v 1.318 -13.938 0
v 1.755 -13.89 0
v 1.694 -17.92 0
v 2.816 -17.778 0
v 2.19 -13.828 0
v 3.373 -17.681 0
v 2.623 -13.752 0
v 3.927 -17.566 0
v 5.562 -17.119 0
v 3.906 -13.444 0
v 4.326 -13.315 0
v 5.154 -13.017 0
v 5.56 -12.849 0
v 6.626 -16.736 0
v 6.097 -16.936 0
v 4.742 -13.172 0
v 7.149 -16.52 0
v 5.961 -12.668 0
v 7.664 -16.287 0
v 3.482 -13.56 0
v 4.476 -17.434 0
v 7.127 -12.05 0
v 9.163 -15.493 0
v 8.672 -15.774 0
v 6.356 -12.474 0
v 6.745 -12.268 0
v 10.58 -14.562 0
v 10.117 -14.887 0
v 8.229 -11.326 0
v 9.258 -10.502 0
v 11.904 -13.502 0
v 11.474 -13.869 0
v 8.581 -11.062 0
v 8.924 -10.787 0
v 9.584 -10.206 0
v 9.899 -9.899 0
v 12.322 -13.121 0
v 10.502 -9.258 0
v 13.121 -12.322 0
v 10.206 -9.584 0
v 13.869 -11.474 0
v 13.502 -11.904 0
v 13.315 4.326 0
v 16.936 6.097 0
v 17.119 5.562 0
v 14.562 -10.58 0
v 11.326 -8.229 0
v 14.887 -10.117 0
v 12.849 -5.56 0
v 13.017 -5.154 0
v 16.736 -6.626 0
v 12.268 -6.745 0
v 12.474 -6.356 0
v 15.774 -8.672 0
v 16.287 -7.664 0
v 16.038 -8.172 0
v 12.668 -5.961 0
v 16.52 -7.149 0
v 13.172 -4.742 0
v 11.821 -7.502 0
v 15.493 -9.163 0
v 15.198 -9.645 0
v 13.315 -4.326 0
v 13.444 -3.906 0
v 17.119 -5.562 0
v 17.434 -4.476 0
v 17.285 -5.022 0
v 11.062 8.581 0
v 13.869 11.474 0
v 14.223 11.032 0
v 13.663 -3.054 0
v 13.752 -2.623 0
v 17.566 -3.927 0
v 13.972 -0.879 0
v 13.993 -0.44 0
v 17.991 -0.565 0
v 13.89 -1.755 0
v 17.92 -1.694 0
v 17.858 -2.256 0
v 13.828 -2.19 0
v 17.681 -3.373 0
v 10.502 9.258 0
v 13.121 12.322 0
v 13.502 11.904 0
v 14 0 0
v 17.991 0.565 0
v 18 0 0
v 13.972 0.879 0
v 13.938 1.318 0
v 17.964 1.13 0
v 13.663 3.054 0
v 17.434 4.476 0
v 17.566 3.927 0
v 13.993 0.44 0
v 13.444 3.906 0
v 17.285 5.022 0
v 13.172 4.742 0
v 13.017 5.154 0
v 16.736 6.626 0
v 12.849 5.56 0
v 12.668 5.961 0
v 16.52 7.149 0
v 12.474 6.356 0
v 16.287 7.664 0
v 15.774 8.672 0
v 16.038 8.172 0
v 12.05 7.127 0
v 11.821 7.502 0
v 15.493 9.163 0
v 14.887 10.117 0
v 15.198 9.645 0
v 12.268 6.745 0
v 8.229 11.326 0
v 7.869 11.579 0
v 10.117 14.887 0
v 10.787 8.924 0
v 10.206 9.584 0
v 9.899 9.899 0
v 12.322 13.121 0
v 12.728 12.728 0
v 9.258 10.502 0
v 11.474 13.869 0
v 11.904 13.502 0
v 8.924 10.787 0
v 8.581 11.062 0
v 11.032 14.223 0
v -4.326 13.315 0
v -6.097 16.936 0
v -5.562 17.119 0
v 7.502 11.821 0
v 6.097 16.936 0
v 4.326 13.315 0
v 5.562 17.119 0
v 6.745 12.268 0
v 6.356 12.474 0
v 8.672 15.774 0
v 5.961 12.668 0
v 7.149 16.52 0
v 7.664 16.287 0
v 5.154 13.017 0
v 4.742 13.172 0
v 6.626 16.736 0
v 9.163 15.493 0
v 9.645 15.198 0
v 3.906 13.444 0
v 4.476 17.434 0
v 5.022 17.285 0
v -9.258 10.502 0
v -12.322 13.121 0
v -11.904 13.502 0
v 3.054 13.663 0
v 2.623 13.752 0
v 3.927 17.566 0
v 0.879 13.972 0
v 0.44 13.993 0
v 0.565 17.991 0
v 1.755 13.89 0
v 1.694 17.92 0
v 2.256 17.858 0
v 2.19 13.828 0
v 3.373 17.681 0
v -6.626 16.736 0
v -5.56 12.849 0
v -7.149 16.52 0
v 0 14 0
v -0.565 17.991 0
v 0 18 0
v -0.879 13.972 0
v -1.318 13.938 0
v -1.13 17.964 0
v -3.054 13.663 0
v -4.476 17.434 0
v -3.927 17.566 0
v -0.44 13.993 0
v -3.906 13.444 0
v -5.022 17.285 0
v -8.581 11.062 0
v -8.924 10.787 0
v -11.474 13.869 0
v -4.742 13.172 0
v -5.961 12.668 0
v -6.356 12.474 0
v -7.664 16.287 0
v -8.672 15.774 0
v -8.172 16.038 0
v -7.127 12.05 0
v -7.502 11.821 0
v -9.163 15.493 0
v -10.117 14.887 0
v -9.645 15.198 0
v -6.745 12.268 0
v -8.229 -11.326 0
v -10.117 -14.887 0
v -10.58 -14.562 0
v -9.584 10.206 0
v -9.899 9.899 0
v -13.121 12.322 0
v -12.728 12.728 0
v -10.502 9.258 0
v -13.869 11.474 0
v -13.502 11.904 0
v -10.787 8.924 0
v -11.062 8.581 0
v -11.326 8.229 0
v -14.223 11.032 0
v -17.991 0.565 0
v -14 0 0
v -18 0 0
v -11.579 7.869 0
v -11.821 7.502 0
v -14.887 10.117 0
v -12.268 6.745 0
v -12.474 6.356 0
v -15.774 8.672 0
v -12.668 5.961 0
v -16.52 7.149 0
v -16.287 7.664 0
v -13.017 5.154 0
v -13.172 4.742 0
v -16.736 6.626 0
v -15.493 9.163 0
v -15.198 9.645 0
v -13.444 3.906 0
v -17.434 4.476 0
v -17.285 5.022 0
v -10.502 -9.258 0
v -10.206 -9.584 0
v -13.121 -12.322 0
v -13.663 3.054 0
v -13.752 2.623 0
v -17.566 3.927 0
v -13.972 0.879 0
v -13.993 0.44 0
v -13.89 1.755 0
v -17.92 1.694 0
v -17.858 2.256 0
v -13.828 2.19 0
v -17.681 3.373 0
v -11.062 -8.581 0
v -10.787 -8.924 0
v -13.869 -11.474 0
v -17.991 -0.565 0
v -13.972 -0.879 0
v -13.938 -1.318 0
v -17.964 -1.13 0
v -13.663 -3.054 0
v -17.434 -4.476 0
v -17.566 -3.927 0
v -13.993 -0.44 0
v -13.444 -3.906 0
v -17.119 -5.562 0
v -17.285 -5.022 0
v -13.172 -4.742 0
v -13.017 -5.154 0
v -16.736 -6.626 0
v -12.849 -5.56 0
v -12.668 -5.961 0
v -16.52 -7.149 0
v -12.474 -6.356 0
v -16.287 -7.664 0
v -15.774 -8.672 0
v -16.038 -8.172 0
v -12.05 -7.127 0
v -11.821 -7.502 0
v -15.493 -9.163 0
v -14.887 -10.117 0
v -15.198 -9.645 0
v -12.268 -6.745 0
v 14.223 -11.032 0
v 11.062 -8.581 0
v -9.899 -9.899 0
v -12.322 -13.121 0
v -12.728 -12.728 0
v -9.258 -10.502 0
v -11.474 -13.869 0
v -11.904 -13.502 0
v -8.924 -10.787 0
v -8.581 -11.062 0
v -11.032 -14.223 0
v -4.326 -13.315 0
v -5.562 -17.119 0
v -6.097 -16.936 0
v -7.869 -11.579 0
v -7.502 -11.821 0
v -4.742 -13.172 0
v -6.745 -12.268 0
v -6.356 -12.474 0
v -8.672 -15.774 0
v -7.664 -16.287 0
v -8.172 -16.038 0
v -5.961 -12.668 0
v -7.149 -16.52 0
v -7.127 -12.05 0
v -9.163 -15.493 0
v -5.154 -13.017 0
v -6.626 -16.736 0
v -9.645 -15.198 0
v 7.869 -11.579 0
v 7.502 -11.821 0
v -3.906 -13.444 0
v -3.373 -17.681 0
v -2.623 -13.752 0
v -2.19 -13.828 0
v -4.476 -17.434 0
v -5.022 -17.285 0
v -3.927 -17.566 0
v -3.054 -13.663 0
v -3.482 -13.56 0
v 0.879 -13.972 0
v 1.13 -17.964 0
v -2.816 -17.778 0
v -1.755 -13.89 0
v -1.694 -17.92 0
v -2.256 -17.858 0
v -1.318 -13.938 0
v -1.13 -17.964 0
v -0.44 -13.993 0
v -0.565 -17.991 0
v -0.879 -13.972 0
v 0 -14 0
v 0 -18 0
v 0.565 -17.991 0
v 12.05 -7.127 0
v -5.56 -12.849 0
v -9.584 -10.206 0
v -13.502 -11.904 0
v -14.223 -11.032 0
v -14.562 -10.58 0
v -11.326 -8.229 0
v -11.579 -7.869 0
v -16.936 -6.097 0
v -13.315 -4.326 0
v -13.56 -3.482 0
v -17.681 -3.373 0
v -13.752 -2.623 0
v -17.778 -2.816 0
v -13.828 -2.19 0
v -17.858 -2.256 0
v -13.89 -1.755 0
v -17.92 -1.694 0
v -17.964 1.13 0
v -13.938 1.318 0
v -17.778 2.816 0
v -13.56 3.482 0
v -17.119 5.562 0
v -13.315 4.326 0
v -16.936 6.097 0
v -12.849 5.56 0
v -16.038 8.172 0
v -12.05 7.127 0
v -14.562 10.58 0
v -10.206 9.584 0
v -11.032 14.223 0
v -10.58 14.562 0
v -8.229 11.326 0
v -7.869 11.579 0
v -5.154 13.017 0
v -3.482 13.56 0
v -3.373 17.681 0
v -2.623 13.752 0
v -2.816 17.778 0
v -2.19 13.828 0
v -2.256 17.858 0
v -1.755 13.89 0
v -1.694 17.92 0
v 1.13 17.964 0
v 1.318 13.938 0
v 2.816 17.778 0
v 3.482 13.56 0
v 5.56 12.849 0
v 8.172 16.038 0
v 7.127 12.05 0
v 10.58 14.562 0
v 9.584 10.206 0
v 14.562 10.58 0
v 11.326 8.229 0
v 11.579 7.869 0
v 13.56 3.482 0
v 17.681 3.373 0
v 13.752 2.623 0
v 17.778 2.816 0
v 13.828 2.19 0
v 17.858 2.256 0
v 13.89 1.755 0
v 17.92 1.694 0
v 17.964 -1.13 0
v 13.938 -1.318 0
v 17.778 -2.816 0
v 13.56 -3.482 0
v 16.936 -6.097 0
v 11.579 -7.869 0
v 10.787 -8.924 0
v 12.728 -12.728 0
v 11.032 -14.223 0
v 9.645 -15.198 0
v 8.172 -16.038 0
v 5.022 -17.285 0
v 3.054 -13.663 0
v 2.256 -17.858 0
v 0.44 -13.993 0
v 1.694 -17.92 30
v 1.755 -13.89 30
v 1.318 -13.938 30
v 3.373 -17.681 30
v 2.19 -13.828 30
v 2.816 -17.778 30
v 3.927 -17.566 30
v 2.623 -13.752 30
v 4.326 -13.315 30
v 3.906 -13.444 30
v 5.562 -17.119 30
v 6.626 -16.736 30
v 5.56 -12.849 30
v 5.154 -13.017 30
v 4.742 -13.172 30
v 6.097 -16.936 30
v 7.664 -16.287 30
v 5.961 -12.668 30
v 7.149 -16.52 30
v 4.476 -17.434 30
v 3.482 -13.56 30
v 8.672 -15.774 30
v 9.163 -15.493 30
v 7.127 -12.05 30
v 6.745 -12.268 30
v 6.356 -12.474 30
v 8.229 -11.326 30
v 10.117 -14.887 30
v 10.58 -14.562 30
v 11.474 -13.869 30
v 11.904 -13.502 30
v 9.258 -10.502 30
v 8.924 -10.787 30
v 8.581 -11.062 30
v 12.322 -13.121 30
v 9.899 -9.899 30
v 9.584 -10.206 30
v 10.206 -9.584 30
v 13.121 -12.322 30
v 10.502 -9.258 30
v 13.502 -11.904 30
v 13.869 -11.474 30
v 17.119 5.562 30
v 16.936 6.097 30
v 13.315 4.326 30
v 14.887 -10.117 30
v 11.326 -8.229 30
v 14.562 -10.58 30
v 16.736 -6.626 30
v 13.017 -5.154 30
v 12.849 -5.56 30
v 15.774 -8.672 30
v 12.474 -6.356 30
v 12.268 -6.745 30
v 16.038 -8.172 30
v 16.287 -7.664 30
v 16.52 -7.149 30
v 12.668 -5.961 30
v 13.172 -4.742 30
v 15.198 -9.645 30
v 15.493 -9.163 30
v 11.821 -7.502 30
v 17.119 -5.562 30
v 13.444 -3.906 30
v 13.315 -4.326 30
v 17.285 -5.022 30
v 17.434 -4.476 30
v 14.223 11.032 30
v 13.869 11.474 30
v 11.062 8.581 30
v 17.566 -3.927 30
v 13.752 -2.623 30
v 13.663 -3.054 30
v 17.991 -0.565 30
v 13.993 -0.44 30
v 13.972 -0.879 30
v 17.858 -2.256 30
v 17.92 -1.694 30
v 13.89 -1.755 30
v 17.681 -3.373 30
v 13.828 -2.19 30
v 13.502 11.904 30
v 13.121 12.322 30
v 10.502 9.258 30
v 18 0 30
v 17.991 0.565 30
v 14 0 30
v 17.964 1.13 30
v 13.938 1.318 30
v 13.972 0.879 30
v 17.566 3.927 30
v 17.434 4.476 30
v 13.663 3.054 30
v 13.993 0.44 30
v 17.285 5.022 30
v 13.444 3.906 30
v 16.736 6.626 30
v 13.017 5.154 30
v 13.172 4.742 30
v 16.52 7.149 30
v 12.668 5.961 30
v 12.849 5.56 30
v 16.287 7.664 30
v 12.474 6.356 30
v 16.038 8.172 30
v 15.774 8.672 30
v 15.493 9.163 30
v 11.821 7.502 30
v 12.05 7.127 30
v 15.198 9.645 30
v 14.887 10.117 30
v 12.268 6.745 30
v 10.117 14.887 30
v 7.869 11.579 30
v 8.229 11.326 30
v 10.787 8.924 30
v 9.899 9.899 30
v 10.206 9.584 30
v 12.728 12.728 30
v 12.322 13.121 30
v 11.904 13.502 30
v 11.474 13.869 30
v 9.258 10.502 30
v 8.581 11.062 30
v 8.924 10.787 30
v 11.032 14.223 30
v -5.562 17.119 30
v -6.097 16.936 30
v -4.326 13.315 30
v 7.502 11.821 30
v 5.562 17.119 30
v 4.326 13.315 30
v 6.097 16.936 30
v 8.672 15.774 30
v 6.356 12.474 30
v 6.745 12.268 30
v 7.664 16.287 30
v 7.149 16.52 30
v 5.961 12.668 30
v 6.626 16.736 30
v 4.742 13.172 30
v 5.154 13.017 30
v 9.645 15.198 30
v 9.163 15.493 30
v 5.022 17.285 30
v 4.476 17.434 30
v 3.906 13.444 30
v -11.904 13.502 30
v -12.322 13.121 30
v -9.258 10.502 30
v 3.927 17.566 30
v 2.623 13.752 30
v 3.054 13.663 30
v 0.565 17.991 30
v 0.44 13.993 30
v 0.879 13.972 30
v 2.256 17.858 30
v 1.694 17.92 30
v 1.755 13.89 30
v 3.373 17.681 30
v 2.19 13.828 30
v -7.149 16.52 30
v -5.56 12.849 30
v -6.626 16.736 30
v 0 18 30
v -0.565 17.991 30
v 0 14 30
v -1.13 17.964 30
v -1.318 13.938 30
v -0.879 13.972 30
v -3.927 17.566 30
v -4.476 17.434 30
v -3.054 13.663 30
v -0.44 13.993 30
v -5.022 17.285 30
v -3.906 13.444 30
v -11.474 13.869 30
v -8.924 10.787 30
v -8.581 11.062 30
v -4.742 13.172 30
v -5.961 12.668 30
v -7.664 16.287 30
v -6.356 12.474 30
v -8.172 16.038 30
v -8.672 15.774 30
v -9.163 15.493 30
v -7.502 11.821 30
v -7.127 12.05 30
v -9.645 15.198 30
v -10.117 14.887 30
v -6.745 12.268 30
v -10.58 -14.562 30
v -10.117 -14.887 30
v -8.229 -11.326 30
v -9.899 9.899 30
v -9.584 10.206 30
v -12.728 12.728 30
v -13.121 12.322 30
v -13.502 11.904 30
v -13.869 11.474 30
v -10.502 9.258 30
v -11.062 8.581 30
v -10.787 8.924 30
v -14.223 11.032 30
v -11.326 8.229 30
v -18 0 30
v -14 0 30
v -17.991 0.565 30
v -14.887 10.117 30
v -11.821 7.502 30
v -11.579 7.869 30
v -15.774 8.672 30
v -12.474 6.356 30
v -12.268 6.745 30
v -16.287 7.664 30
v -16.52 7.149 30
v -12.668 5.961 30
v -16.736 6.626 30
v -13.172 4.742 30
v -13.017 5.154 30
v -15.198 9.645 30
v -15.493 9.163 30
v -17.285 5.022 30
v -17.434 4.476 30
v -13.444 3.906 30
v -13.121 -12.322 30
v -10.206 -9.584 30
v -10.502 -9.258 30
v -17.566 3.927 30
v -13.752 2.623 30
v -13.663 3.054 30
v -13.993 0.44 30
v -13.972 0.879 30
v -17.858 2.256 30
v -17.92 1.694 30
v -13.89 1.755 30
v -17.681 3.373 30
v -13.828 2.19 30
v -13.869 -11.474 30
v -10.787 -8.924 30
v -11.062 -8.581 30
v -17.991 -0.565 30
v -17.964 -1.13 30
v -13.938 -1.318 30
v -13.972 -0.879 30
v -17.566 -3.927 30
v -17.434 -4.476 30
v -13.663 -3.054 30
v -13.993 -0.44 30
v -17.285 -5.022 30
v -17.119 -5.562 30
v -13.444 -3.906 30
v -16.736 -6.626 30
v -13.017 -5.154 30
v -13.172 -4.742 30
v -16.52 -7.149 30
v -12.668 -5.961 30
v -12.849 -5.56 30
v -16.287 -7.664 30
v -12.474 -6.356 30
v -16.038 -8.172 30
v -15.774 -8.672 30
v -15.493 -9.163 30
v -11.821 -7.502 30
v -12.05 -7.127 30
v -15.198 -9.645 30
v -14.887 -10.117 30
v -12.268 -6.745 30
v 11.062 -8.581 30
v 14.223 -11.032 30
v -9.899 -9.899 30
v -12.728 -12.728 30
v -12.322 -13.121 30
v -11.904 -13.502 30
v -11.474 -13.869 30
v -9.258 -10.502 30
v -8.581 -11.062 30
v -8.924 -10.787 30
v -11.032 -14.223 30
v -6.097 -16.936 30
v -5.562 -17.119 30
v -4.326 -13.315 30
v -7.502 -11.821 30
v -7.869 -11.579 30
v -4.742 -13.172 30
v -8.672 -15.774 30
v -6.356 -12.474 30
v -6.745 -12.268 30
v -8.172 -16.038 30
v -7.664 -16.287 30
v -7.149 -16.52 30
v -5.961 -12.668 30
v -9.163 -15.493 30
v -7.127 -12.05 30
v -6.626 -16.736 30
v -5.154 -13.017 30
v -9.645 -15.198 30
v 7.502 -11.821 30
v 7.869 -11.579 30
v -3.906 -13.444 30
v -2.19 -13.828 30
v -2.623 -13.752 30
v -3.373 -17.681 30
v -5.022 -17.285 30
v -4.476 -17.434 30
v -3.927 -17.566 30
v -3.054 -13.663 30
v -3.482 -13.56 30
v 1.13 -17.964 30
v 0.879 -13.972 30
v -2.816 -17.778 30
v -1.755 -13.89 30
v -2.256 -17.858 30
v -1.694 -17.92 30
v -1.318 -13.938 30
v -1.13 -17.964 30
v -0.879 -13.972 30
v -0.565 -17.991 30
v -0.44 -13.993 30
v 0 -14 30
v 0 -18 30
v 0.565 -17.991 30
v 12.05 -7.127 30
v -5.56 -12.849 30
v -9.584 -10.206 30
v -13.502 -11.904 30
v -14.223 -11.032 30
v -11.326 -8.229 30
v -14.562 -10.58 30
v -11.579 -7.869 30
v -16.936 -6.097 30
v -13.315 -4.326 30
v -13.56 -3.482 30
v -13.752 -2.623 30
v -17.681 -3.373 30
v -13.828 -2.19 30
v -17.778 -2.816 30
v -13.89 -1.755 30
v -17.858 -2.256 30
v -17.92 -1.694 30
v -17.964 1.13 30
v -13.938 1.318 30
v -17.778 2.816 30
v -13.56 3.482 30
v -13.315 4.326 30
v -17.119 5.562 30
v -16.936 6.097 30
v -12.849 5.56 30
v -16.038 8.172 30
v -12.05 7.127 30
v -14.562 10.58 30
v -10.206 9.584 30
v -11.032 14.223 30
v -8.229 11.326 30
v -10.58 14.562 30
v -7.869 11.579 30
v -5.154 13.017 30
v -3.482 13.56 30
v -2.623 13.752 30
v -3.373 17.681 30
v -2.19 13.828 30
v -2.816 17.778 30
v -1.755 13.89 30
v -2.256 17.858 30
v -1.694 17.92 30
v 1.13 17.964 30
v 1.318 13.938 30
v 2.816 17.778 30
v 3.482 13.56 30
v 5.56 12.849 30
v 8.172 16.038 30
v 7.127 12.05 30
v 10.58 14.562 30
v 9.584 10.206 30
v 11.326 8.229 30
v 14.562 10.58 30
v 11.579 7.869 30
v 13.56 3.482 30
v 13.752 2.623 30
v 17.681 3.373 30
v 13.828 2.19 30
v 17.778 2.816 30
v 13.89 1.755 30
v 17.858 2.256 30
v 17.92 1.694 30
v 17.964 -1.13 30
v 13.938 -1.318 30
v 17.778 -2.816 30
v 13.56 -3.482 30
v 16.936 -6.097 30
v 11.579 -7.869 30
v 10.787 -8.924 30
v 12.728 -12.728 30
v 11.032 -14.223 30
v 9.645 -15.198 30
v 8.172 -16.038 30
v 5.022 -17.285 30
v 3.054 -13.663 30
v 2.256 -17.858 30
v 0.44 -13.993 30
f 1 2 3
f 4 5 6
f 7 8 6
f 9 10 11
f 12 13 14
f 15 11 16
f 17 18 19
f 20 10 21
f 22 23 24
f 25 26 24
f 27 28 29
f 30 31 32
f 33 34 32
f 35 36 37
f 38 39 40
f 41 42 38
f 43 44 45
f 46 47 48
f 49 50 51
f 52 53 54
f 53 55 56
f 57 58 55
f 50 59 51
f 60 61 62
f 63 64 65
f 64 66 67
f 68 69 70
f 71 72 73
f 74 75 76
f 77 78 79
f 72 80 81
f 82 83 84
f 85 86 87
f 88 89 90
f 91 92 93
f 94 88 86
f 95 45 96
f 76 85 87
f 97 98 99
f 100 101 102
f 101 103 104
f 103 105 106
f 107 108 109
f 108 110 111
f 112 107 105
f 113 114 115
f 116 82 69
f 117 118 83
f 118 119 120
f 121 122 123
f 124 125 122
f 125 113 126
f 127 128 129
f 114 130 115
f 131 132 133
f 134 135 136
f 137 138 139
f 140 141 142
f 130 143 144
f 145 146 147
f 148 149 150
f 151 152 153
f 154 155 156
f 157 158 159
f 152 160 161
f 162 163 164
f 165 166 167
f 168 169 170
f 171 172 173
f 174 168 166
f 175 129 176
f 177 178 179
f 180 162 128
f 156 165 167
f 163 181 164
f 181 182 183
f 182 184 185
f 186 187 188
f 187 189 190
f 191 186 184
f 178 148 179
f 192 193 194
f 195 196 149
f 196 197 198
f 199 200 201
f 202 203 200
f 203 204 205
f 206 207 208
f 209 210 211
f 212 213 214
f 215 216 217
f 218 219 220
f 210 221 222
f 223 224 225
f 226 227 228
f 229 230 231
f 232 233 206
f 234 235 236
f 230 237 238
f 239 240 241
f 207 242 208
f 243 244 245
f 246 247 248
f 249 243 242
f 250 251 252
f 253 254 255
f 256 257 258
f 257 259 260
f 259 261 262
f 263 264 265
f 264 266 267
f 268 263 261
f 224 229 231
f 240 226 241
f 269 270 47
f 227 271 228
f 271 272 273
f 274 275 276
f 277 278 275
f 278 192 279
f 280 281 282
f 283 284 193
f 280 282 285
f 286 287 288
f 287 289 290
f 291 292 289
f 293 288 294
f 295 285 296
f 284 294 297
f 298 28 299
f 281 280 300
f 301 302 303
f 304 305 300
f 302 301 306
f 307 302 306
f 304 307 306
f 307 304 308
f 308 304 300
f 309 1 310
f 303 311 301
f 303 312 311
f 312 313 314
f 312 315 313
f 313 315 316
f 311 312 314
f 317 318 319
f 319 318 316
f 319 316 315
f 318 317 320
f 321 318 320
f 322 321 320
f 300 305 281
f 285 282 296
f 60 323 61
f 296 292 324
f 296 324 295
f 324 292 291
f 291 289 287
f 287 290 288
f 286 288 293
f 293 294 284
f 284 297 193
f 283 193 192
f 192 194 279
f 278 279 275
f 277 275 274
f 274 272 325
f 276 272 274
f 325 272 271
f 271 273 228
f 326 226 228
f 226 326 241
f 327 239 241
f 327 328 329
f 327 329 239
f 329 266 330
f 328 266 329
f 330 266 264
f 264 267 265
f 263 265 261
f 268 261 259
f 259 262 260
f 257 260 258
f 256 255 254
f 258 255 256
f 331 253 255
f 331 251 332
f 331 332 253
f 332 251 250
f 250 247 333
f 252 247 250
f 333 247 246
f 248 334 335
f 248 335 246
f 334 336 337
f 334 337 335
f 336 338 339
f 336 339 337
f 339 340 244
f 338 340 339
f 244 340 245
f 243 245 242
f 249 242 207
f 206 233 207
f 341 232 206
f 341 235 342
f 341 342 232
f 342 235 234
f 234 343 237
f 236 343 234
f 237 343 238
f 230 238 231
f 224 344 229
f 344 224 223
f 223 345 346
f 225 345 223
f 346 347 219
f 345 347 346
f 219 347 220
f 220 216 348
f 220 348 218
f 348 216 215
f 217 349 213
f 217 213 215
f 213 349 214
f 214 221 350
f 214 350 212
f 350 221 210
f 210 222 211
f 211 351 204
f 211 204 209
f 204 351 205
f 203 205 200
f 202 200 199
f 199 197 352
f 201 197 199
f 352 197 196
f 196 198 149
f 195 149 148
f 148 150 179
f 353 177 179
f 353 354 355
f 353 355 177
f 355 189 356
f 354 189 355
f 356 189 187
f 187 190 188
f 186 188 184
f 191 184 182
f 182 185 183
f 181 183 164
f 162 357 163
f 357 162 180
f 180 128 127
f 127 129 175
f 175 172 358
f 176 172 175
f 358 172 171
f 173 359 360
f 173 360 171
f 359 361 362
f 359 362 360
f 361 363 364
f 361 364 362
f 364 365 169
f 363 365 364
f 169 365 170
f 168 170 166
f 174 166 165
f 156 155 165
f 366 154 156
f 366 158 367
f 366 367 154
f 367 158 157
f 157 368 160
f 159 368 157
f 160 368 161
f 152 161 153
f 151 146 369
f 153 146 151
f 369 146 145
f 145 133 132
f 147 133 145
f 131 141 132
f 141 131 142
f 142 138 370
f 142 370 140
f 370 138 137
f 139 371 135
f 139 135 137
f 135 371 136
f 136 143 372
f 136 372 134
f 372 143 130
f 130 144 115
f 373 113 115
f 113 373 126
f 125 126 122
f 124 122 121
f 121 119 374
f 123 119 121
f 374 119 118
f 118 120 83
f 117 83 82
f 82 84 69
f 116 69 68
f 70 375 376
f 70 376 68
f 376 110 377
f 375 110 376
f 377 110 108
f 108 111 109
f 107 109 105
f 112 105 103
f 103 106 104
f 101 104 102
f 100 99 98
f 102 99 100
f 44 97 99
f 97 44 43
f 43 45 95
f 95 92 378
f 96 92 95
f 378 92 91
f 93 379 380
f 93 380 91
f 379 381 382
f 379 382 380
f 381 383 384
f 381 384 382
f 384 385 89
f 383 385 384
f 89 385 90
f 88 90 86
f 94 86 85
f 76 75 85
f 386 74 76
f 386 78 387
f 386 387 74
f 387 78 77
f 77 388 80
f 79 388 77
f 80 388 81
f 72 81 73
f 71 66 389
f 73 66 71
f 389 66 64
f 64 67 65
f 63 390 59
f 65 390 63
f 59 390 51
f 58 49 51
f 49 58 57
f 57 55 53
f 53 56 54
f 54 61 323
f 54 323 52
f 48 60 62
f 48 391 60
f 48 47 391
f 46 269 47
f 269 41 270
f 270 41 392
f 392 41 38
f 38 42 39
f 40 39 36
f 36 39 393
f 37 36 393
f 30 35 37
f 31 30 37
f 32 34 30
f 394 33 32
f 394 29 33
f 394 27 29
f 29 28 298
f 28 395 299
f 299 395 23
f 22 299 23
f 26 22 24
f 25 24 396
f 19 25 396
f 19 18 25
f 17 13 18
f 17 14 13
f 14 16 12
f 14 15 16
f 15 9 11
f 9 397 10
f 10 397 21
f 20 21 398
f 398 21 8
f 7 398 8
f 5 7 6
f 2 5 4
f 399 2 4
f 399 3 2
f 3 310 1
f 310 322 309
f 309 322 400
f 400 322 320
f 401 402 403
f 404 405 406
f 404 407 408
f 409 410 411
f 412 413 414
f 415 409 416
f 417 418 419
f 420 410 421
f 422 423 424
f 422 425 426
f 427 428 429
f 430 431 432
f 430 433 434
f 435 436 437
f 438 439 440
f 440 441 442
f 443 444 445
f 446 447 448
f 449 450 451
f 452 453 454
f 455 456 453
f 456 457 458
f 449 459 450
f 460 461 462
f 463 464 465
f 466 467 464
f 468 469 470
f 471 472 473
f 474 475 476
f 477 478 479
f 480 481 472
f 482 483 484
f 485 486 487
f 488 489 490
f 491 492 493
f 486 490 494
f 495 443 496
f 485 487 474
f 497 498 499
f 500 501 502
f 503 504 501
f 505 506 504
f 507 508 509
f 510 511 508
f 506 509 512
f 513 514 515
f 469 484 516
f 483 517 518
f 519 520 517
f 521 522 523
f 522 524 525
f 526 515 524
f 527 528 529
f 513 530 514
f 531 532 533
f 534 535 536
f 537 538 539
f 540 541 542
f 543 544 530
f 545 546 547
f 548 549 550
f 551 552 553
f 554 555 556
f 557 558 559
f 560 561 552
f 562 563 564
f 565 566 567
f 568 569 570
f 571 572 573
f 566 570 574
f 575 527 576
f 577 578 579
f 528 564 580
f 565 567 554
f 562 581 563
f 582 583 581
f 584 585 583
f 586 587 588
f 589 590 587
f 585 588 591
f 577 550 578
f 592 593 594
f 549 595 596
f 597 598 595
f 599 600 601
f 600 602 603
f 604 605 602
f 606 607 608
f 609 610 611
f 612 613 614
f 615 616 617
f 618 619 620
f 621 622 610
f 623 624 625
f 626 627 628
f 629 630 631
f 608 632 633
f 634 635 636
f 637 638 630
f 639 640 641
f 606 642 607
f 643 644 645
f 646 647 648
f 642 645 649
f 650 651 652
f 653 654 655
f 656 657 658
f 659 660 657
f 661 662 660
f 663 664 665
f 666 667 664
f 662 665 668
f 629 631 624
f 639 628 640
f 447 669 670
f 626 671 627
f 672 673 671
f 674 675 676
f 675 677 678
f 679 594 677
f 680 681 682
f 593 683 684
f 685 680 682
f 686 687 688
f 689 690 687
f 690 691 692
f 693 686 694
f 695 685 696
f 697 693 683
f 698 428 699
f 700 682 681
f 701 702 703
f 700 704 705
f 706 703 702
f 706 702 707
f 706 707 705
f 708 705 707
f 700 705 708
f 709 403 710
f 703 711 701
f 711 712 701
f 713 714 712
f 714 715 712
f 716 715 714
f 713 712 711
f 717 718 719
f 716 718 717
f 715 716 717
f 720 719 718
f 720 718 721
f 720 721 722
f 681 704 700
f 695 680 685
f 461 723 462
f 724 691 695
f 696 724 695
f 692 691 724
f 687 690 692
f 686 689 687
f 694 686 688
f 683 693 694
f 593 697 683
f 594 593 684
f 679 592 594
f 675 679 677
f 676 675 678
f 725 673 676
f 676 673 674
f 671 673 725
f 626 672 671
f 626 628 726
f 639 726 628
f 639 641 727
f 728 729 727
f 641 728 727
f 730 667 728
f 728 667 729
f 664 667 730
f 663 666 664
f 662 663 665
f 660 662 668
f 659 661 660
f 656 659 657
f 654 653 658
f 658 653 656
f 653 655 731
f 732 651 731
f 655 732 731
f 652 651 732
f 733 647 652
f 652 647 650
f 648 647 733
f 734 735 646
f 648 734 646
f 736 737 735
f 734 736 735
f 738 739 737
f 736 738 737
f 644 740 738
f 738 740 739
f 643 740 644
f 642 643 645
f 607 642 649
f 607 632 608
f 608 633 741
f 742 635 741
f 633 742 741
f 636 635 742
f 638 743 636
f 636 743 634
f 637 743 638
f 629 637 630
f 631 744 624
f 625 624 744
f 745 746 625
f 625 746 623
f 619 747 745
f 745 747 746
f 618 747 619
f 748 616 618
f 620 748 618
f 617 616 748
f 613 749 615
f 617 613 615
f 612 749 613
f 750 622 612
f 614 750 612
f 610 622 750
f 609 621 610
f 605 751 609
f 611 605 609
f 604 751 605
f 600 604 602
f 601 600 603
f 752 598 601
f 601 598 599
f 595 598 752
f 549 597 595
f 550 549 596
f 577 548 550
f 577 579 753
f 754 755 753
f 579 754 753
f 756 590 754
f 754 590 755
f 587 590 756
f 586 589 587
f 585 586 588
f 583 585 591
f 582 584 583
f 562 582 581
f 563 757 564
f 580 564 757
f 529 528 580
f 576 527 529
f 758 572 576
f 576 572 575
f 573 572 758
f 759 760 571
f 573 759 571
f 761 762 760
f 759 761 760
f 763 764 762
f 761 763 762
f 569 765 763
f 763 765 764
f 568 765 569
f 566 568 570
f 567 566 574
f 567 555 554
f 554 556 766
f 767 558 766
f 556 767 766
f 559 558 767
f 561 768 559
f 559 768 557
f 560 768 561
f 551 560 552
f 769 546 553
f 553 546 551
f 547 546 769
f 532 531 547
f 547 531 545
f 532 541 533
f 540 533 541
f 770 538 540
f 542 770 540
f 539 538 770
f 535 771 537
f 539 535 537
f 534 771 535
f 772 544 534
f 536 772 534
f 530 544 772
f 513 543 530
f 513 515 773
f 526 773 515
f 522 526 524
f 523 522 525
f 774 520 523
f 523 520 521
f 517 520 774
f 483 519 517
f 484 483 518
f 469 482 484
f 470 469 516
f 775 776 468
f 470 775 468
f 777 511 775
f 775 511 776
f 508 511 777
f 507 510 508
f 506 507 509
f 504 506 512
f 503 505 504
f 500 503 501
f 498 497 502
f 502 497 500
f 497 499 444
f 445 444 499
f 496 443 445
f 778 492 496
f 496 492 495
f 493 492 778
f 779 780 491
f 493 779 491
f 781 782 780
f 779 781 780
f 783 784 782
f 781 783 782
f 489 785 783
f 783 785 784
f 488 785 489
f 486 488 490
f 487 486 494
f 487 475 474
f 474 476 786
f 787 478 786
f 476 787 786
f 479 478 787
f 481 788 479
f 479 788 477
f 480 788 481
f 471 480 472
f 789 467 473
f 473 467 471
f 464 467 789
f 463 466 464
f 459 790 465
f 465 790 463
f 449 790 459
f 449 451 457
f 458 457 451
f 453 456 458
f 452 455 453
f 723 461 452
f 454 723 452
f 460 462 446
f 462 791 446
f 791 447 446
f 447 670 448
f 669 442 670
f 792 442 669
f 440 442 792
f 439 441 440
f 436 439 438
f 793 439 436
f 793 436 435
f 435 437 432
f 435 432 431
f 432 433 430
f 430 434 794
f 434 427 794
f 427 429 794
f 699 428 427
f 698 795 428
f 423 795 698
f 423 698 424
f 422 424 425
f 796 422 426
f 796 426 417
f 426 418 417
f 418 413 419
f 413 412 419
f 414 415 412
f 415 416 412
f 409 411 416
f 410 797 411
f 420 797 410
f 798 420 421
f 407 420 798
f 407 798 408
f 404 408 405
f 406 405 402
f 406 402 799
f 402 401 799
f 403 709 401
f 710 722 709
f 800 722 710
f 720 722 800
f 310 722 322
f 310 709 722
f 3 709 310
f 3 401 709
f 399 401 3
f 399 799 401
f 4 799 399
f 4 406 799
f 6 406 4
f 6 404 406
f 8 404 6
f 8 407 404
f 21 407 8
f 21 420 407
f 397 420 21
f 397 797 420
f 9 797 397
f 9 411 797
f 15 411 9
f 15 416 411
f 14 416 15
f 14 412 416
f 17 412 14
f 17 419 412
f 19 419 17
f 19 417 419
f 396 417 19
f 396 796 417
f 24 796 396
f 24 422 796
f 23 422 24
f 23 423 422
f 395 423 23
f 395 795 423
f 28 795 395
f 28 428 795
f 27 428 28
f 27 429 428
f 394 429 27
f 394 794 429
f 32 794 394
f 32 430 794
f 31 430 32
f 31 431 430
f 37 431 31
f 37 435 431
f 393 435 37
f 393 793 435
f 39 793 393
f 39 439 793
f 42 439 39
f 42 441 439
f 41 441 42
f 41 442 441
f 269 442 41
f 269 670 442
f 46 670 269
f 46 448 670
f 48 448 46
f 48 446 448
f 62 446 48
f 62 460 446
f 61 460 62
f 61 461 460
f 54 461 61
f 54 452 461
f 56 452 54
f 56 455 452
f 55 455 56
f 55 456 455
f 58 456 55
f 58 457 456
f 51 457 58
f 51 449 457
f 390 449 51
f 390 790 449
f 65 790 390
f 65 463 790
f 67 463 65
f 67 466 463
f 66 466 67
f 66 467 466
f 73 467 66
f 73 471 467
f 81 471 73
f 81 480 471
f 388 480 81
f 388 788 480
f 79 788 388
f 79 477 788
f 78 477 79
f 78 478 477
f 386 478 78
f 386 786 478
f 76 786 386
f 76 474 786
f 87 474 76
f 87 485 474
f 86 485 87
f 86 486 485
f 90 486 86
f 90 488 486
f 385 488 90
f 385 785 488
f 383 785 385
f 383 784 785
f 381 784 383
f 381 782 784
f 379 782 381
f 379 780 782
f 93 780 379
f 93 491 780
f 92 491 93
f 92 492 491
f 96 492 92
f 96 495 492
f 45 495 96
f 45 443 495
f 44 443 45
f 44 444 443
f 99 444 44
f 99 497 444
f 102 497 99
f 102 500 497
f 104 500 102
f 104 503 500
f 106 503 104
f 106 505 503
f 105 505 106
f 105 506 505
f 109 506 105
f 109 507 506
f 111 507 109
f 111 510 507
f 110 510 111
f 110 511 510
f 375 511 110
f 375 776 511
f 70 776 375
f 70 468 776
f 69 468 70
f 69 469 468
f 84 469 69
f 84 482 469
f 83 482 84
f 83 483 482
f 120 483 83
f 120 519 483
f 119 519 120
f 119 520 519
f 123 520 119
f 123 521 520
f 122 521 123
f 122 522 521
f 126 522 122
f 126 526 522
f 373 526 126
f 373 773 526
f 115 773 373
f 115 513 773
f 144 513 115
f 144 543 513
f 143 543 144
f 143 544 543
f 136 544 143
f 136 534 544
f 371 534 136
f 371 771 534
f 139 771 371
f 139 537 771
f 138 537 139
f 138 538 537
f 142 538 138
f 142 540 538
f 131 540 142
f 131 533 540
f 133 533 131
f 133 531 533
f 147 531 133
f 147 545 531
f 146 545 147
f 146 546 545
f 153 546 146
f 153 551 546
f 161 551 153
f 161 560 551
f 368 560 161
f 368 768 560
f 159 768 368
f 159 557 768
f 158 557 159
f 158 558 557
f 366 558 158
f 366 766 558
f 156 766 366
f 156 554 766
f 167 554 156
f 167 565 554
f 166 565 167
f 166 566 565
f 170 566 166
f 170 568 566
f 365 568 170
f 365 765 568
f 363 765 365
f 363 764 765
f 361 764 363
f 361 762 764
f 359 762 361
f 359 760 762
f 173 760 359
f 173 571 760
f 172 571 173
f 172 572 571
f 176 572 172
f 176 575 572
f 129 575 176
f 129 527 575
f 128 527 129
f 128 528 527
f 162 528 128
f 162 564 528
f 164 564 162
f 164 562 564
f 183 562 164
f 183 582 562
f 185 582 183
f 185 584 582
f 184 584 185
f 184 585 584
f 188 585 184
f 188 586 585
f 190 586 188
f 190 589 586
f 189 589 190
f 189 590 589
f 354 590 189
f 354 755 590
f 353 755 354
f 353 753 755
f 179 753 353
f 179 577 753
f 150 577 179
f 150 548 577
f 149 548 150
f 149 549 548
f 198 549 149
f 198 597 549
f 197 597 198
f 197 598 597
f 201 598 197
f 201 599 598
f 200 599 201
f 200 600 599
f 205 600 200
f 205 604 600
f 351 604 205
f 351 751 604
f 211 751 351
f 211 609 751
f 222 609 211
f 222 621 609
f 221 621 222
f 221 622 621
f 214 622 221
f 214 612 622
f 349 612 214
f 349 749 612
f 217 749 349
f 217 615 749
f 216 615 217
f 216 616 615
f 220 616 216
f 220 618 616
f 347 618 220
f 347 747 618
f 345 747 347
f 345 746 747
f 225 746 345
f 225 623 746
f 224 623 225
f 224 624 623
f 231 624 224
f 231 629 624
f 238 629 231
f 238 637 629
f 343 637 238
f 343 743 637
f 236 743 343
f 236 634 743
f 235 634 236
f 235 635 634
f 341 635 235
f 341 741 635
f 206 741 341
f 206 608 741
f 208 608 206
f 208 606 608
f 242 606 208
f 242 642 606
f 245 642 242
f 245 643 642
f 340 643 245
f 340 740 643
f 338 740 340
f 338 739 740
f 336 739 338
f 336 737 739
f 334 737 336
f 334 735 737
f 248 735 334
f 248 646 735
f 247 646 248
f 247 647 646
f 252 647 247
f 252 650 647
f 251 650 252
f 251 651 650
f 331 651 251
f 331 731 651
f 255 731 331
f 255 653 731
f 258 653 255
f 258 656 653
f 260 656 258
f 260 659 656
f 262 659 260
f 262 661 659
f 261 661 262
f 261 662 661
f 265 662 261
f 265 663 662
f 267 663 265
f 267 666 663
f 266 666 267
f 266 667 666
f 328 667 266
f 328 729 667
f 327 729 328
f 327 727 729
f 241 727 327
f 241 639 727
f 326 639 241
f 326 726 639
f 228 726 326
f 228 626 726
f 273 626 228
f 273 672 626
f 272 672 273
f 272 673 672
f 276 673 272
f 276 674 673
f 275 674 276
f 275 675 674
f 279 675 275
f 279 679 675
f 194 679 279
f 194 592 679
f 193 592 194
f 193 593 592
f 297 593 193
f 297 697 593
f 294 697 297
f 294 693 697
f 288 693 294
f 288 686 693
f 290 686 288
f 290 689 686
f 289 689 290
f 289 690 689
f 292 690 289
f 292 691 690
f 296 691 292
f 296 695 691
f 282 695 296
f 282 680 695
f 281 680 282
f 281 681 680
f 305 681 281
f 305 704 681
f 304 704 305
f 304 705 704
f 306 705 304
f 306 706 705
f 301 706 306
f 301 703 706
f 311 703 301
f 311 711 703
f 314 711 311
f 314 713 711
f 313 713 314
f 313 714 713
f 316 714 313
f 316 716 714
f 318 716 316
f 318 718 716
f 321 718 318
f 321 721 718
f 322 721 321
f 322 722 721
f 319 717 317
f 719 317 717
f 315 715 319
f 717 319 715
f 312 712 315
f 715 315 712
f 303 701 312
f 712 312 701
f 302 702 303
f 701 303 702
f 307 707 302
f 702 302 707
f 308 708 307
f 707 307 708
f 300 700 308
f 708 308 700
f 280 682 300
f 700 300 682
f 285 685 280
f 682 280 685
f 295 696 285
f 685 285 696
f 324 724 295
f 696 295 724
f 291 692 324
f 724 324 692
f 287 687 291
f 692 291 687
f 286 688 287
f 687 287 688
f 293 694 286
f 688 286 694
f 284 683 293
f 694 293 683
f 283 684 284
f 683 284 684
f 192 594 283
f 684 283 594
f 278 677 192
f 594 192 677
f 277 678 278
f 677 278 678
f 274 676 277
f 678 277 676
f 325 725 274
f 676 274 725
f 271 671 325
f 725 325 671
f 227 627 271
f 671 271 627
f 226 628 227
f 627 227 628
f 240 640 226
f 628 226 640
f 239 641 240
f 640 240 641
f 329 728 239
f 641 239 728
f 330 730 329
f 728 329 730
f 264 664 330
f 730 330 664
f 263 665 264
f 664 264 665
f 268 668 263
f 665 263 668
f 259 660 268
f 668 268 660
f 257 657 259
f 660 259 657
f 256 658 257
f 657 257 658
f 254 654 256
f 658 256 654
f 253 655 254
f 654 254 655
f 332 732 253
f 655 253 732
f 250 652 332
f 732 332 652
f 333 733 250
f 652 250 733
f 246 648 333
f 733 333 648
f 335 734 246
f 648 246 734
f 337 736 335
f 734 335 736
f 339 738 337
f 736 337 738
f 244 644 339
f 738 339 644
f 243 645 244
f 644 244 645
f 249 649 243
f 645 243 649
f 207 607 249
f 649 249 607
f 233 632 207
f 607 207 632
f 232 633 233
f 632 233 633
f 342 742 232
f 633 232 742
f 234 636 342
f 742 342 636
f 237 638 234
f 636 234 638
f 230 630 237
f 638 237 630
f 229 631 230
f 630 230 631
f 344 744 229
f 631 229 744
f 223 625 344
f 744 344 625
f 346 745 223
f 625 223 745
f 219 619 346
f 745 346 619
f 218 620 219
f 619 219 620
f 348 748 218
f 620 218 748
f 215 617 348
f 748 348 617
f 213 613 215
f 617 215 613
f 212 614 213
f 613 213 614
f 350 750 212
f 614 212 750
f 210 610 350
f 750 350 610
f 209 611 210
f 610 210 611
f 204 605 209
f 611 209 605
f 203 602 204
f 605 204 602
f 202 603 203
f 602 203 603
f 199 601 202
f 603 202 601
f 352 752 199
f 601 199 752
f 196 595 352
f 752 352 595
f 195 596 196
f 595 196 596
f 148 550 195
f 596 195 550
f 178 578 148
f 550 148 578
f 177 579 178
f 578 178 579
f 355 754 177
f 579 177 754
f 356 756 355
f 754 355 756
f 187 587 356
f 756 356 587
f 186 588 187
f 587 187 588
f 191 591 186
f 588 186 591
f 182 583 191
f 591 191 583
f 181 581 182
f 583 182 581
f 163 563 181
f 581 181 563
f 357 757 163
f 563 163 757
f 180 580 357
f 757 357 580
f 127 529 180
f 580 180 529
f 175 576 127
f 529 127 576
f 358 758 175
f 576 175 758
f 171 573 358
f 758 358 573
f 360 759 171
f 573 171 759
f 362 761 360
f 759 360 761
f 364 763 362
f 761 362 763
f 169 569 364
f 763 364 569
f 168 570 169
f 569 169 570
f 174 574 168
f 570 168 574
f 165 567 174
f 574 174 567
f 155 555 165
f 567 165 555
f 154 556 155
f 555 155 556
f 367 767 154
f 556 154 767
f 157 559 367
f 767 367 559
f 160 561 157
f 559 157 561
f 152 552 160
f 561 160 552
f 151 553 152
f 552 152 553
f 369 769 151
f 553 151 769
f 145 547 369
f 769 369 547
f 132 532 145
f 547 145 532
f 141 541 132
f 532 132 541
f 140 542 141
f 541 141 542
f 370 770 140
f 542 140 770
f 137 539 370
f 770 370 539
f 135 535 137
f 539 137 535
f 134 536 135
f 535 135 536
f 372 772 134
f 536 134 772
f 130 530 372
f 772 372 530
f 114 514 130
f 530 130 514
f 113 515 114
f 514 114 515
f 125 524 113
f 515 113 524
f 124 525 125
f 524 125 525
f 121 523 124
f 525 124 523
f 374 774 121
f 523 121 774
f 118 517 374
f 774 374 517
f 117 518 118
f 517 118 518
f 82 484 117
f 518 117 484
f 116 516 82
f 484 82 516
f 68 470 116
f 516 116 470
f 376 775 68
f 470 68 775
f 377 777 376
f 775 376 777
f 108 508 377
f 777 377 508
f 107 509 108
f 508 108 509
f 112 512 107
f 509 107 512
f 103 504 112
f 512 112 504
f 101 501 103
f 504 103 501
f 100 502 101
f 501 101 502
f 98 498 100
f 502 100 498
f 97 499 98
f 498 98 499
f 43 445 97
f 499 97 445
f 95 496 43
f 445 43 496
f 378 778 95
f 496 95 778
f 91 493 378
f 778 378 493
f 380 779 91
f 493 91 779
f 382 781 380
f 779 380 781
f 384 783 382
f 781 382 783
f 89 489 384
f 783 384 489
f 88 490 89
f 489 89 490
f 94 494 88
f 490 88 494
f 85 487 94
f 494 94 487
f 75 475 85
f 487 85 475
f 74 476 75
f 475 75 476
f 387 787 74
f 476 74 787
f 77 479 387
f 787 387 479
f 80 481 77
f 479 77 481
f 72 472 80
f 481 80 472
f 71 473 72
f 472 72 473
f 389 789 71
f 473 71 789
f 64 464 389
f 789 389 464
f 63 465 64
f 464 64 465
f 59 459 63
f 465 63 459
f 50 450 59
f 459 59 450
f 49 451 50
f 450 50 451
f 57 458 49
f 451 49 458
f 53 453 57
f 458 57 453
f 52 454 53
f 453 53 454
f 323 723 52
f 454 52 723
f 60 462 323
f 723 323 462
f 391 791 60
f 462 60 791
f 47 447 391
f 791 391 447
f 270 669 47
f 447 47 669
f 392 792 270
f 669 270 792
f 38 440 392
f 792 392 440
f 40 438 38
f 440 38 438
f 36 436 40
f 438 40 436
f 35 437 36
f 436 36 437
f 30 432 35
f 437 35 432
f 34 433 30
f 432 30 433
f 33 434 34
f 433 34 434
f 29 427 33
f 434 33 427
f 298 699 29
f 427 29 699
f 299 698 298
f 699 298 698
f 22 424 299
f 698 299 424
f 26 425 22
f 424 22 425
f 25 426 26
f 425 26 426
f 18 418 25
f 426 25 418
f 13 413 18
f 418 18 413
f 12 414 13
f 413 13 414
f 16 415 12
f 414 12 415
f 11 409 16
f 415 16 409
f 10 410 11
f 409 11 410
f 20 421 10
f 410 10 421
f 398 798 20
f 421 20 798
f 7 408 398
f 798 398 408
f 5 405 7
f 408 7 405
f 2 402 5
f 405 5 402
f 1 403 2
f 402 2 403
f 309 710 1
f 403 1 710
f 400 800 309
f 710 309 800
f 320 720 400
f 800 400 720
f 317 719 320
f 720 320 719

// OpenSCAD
// Deler per sirkel
$fn = 200;

// Variabler
vegg = 4;
id = 28;        // indre diameter
od = id+vegg*2; // ytre diameter
h = 30;         // høyde

// Magick goes here!!!!
linear_extrude(h) {
    difference() {
        circle(d=od);
        circle(d=id);
    }
}
